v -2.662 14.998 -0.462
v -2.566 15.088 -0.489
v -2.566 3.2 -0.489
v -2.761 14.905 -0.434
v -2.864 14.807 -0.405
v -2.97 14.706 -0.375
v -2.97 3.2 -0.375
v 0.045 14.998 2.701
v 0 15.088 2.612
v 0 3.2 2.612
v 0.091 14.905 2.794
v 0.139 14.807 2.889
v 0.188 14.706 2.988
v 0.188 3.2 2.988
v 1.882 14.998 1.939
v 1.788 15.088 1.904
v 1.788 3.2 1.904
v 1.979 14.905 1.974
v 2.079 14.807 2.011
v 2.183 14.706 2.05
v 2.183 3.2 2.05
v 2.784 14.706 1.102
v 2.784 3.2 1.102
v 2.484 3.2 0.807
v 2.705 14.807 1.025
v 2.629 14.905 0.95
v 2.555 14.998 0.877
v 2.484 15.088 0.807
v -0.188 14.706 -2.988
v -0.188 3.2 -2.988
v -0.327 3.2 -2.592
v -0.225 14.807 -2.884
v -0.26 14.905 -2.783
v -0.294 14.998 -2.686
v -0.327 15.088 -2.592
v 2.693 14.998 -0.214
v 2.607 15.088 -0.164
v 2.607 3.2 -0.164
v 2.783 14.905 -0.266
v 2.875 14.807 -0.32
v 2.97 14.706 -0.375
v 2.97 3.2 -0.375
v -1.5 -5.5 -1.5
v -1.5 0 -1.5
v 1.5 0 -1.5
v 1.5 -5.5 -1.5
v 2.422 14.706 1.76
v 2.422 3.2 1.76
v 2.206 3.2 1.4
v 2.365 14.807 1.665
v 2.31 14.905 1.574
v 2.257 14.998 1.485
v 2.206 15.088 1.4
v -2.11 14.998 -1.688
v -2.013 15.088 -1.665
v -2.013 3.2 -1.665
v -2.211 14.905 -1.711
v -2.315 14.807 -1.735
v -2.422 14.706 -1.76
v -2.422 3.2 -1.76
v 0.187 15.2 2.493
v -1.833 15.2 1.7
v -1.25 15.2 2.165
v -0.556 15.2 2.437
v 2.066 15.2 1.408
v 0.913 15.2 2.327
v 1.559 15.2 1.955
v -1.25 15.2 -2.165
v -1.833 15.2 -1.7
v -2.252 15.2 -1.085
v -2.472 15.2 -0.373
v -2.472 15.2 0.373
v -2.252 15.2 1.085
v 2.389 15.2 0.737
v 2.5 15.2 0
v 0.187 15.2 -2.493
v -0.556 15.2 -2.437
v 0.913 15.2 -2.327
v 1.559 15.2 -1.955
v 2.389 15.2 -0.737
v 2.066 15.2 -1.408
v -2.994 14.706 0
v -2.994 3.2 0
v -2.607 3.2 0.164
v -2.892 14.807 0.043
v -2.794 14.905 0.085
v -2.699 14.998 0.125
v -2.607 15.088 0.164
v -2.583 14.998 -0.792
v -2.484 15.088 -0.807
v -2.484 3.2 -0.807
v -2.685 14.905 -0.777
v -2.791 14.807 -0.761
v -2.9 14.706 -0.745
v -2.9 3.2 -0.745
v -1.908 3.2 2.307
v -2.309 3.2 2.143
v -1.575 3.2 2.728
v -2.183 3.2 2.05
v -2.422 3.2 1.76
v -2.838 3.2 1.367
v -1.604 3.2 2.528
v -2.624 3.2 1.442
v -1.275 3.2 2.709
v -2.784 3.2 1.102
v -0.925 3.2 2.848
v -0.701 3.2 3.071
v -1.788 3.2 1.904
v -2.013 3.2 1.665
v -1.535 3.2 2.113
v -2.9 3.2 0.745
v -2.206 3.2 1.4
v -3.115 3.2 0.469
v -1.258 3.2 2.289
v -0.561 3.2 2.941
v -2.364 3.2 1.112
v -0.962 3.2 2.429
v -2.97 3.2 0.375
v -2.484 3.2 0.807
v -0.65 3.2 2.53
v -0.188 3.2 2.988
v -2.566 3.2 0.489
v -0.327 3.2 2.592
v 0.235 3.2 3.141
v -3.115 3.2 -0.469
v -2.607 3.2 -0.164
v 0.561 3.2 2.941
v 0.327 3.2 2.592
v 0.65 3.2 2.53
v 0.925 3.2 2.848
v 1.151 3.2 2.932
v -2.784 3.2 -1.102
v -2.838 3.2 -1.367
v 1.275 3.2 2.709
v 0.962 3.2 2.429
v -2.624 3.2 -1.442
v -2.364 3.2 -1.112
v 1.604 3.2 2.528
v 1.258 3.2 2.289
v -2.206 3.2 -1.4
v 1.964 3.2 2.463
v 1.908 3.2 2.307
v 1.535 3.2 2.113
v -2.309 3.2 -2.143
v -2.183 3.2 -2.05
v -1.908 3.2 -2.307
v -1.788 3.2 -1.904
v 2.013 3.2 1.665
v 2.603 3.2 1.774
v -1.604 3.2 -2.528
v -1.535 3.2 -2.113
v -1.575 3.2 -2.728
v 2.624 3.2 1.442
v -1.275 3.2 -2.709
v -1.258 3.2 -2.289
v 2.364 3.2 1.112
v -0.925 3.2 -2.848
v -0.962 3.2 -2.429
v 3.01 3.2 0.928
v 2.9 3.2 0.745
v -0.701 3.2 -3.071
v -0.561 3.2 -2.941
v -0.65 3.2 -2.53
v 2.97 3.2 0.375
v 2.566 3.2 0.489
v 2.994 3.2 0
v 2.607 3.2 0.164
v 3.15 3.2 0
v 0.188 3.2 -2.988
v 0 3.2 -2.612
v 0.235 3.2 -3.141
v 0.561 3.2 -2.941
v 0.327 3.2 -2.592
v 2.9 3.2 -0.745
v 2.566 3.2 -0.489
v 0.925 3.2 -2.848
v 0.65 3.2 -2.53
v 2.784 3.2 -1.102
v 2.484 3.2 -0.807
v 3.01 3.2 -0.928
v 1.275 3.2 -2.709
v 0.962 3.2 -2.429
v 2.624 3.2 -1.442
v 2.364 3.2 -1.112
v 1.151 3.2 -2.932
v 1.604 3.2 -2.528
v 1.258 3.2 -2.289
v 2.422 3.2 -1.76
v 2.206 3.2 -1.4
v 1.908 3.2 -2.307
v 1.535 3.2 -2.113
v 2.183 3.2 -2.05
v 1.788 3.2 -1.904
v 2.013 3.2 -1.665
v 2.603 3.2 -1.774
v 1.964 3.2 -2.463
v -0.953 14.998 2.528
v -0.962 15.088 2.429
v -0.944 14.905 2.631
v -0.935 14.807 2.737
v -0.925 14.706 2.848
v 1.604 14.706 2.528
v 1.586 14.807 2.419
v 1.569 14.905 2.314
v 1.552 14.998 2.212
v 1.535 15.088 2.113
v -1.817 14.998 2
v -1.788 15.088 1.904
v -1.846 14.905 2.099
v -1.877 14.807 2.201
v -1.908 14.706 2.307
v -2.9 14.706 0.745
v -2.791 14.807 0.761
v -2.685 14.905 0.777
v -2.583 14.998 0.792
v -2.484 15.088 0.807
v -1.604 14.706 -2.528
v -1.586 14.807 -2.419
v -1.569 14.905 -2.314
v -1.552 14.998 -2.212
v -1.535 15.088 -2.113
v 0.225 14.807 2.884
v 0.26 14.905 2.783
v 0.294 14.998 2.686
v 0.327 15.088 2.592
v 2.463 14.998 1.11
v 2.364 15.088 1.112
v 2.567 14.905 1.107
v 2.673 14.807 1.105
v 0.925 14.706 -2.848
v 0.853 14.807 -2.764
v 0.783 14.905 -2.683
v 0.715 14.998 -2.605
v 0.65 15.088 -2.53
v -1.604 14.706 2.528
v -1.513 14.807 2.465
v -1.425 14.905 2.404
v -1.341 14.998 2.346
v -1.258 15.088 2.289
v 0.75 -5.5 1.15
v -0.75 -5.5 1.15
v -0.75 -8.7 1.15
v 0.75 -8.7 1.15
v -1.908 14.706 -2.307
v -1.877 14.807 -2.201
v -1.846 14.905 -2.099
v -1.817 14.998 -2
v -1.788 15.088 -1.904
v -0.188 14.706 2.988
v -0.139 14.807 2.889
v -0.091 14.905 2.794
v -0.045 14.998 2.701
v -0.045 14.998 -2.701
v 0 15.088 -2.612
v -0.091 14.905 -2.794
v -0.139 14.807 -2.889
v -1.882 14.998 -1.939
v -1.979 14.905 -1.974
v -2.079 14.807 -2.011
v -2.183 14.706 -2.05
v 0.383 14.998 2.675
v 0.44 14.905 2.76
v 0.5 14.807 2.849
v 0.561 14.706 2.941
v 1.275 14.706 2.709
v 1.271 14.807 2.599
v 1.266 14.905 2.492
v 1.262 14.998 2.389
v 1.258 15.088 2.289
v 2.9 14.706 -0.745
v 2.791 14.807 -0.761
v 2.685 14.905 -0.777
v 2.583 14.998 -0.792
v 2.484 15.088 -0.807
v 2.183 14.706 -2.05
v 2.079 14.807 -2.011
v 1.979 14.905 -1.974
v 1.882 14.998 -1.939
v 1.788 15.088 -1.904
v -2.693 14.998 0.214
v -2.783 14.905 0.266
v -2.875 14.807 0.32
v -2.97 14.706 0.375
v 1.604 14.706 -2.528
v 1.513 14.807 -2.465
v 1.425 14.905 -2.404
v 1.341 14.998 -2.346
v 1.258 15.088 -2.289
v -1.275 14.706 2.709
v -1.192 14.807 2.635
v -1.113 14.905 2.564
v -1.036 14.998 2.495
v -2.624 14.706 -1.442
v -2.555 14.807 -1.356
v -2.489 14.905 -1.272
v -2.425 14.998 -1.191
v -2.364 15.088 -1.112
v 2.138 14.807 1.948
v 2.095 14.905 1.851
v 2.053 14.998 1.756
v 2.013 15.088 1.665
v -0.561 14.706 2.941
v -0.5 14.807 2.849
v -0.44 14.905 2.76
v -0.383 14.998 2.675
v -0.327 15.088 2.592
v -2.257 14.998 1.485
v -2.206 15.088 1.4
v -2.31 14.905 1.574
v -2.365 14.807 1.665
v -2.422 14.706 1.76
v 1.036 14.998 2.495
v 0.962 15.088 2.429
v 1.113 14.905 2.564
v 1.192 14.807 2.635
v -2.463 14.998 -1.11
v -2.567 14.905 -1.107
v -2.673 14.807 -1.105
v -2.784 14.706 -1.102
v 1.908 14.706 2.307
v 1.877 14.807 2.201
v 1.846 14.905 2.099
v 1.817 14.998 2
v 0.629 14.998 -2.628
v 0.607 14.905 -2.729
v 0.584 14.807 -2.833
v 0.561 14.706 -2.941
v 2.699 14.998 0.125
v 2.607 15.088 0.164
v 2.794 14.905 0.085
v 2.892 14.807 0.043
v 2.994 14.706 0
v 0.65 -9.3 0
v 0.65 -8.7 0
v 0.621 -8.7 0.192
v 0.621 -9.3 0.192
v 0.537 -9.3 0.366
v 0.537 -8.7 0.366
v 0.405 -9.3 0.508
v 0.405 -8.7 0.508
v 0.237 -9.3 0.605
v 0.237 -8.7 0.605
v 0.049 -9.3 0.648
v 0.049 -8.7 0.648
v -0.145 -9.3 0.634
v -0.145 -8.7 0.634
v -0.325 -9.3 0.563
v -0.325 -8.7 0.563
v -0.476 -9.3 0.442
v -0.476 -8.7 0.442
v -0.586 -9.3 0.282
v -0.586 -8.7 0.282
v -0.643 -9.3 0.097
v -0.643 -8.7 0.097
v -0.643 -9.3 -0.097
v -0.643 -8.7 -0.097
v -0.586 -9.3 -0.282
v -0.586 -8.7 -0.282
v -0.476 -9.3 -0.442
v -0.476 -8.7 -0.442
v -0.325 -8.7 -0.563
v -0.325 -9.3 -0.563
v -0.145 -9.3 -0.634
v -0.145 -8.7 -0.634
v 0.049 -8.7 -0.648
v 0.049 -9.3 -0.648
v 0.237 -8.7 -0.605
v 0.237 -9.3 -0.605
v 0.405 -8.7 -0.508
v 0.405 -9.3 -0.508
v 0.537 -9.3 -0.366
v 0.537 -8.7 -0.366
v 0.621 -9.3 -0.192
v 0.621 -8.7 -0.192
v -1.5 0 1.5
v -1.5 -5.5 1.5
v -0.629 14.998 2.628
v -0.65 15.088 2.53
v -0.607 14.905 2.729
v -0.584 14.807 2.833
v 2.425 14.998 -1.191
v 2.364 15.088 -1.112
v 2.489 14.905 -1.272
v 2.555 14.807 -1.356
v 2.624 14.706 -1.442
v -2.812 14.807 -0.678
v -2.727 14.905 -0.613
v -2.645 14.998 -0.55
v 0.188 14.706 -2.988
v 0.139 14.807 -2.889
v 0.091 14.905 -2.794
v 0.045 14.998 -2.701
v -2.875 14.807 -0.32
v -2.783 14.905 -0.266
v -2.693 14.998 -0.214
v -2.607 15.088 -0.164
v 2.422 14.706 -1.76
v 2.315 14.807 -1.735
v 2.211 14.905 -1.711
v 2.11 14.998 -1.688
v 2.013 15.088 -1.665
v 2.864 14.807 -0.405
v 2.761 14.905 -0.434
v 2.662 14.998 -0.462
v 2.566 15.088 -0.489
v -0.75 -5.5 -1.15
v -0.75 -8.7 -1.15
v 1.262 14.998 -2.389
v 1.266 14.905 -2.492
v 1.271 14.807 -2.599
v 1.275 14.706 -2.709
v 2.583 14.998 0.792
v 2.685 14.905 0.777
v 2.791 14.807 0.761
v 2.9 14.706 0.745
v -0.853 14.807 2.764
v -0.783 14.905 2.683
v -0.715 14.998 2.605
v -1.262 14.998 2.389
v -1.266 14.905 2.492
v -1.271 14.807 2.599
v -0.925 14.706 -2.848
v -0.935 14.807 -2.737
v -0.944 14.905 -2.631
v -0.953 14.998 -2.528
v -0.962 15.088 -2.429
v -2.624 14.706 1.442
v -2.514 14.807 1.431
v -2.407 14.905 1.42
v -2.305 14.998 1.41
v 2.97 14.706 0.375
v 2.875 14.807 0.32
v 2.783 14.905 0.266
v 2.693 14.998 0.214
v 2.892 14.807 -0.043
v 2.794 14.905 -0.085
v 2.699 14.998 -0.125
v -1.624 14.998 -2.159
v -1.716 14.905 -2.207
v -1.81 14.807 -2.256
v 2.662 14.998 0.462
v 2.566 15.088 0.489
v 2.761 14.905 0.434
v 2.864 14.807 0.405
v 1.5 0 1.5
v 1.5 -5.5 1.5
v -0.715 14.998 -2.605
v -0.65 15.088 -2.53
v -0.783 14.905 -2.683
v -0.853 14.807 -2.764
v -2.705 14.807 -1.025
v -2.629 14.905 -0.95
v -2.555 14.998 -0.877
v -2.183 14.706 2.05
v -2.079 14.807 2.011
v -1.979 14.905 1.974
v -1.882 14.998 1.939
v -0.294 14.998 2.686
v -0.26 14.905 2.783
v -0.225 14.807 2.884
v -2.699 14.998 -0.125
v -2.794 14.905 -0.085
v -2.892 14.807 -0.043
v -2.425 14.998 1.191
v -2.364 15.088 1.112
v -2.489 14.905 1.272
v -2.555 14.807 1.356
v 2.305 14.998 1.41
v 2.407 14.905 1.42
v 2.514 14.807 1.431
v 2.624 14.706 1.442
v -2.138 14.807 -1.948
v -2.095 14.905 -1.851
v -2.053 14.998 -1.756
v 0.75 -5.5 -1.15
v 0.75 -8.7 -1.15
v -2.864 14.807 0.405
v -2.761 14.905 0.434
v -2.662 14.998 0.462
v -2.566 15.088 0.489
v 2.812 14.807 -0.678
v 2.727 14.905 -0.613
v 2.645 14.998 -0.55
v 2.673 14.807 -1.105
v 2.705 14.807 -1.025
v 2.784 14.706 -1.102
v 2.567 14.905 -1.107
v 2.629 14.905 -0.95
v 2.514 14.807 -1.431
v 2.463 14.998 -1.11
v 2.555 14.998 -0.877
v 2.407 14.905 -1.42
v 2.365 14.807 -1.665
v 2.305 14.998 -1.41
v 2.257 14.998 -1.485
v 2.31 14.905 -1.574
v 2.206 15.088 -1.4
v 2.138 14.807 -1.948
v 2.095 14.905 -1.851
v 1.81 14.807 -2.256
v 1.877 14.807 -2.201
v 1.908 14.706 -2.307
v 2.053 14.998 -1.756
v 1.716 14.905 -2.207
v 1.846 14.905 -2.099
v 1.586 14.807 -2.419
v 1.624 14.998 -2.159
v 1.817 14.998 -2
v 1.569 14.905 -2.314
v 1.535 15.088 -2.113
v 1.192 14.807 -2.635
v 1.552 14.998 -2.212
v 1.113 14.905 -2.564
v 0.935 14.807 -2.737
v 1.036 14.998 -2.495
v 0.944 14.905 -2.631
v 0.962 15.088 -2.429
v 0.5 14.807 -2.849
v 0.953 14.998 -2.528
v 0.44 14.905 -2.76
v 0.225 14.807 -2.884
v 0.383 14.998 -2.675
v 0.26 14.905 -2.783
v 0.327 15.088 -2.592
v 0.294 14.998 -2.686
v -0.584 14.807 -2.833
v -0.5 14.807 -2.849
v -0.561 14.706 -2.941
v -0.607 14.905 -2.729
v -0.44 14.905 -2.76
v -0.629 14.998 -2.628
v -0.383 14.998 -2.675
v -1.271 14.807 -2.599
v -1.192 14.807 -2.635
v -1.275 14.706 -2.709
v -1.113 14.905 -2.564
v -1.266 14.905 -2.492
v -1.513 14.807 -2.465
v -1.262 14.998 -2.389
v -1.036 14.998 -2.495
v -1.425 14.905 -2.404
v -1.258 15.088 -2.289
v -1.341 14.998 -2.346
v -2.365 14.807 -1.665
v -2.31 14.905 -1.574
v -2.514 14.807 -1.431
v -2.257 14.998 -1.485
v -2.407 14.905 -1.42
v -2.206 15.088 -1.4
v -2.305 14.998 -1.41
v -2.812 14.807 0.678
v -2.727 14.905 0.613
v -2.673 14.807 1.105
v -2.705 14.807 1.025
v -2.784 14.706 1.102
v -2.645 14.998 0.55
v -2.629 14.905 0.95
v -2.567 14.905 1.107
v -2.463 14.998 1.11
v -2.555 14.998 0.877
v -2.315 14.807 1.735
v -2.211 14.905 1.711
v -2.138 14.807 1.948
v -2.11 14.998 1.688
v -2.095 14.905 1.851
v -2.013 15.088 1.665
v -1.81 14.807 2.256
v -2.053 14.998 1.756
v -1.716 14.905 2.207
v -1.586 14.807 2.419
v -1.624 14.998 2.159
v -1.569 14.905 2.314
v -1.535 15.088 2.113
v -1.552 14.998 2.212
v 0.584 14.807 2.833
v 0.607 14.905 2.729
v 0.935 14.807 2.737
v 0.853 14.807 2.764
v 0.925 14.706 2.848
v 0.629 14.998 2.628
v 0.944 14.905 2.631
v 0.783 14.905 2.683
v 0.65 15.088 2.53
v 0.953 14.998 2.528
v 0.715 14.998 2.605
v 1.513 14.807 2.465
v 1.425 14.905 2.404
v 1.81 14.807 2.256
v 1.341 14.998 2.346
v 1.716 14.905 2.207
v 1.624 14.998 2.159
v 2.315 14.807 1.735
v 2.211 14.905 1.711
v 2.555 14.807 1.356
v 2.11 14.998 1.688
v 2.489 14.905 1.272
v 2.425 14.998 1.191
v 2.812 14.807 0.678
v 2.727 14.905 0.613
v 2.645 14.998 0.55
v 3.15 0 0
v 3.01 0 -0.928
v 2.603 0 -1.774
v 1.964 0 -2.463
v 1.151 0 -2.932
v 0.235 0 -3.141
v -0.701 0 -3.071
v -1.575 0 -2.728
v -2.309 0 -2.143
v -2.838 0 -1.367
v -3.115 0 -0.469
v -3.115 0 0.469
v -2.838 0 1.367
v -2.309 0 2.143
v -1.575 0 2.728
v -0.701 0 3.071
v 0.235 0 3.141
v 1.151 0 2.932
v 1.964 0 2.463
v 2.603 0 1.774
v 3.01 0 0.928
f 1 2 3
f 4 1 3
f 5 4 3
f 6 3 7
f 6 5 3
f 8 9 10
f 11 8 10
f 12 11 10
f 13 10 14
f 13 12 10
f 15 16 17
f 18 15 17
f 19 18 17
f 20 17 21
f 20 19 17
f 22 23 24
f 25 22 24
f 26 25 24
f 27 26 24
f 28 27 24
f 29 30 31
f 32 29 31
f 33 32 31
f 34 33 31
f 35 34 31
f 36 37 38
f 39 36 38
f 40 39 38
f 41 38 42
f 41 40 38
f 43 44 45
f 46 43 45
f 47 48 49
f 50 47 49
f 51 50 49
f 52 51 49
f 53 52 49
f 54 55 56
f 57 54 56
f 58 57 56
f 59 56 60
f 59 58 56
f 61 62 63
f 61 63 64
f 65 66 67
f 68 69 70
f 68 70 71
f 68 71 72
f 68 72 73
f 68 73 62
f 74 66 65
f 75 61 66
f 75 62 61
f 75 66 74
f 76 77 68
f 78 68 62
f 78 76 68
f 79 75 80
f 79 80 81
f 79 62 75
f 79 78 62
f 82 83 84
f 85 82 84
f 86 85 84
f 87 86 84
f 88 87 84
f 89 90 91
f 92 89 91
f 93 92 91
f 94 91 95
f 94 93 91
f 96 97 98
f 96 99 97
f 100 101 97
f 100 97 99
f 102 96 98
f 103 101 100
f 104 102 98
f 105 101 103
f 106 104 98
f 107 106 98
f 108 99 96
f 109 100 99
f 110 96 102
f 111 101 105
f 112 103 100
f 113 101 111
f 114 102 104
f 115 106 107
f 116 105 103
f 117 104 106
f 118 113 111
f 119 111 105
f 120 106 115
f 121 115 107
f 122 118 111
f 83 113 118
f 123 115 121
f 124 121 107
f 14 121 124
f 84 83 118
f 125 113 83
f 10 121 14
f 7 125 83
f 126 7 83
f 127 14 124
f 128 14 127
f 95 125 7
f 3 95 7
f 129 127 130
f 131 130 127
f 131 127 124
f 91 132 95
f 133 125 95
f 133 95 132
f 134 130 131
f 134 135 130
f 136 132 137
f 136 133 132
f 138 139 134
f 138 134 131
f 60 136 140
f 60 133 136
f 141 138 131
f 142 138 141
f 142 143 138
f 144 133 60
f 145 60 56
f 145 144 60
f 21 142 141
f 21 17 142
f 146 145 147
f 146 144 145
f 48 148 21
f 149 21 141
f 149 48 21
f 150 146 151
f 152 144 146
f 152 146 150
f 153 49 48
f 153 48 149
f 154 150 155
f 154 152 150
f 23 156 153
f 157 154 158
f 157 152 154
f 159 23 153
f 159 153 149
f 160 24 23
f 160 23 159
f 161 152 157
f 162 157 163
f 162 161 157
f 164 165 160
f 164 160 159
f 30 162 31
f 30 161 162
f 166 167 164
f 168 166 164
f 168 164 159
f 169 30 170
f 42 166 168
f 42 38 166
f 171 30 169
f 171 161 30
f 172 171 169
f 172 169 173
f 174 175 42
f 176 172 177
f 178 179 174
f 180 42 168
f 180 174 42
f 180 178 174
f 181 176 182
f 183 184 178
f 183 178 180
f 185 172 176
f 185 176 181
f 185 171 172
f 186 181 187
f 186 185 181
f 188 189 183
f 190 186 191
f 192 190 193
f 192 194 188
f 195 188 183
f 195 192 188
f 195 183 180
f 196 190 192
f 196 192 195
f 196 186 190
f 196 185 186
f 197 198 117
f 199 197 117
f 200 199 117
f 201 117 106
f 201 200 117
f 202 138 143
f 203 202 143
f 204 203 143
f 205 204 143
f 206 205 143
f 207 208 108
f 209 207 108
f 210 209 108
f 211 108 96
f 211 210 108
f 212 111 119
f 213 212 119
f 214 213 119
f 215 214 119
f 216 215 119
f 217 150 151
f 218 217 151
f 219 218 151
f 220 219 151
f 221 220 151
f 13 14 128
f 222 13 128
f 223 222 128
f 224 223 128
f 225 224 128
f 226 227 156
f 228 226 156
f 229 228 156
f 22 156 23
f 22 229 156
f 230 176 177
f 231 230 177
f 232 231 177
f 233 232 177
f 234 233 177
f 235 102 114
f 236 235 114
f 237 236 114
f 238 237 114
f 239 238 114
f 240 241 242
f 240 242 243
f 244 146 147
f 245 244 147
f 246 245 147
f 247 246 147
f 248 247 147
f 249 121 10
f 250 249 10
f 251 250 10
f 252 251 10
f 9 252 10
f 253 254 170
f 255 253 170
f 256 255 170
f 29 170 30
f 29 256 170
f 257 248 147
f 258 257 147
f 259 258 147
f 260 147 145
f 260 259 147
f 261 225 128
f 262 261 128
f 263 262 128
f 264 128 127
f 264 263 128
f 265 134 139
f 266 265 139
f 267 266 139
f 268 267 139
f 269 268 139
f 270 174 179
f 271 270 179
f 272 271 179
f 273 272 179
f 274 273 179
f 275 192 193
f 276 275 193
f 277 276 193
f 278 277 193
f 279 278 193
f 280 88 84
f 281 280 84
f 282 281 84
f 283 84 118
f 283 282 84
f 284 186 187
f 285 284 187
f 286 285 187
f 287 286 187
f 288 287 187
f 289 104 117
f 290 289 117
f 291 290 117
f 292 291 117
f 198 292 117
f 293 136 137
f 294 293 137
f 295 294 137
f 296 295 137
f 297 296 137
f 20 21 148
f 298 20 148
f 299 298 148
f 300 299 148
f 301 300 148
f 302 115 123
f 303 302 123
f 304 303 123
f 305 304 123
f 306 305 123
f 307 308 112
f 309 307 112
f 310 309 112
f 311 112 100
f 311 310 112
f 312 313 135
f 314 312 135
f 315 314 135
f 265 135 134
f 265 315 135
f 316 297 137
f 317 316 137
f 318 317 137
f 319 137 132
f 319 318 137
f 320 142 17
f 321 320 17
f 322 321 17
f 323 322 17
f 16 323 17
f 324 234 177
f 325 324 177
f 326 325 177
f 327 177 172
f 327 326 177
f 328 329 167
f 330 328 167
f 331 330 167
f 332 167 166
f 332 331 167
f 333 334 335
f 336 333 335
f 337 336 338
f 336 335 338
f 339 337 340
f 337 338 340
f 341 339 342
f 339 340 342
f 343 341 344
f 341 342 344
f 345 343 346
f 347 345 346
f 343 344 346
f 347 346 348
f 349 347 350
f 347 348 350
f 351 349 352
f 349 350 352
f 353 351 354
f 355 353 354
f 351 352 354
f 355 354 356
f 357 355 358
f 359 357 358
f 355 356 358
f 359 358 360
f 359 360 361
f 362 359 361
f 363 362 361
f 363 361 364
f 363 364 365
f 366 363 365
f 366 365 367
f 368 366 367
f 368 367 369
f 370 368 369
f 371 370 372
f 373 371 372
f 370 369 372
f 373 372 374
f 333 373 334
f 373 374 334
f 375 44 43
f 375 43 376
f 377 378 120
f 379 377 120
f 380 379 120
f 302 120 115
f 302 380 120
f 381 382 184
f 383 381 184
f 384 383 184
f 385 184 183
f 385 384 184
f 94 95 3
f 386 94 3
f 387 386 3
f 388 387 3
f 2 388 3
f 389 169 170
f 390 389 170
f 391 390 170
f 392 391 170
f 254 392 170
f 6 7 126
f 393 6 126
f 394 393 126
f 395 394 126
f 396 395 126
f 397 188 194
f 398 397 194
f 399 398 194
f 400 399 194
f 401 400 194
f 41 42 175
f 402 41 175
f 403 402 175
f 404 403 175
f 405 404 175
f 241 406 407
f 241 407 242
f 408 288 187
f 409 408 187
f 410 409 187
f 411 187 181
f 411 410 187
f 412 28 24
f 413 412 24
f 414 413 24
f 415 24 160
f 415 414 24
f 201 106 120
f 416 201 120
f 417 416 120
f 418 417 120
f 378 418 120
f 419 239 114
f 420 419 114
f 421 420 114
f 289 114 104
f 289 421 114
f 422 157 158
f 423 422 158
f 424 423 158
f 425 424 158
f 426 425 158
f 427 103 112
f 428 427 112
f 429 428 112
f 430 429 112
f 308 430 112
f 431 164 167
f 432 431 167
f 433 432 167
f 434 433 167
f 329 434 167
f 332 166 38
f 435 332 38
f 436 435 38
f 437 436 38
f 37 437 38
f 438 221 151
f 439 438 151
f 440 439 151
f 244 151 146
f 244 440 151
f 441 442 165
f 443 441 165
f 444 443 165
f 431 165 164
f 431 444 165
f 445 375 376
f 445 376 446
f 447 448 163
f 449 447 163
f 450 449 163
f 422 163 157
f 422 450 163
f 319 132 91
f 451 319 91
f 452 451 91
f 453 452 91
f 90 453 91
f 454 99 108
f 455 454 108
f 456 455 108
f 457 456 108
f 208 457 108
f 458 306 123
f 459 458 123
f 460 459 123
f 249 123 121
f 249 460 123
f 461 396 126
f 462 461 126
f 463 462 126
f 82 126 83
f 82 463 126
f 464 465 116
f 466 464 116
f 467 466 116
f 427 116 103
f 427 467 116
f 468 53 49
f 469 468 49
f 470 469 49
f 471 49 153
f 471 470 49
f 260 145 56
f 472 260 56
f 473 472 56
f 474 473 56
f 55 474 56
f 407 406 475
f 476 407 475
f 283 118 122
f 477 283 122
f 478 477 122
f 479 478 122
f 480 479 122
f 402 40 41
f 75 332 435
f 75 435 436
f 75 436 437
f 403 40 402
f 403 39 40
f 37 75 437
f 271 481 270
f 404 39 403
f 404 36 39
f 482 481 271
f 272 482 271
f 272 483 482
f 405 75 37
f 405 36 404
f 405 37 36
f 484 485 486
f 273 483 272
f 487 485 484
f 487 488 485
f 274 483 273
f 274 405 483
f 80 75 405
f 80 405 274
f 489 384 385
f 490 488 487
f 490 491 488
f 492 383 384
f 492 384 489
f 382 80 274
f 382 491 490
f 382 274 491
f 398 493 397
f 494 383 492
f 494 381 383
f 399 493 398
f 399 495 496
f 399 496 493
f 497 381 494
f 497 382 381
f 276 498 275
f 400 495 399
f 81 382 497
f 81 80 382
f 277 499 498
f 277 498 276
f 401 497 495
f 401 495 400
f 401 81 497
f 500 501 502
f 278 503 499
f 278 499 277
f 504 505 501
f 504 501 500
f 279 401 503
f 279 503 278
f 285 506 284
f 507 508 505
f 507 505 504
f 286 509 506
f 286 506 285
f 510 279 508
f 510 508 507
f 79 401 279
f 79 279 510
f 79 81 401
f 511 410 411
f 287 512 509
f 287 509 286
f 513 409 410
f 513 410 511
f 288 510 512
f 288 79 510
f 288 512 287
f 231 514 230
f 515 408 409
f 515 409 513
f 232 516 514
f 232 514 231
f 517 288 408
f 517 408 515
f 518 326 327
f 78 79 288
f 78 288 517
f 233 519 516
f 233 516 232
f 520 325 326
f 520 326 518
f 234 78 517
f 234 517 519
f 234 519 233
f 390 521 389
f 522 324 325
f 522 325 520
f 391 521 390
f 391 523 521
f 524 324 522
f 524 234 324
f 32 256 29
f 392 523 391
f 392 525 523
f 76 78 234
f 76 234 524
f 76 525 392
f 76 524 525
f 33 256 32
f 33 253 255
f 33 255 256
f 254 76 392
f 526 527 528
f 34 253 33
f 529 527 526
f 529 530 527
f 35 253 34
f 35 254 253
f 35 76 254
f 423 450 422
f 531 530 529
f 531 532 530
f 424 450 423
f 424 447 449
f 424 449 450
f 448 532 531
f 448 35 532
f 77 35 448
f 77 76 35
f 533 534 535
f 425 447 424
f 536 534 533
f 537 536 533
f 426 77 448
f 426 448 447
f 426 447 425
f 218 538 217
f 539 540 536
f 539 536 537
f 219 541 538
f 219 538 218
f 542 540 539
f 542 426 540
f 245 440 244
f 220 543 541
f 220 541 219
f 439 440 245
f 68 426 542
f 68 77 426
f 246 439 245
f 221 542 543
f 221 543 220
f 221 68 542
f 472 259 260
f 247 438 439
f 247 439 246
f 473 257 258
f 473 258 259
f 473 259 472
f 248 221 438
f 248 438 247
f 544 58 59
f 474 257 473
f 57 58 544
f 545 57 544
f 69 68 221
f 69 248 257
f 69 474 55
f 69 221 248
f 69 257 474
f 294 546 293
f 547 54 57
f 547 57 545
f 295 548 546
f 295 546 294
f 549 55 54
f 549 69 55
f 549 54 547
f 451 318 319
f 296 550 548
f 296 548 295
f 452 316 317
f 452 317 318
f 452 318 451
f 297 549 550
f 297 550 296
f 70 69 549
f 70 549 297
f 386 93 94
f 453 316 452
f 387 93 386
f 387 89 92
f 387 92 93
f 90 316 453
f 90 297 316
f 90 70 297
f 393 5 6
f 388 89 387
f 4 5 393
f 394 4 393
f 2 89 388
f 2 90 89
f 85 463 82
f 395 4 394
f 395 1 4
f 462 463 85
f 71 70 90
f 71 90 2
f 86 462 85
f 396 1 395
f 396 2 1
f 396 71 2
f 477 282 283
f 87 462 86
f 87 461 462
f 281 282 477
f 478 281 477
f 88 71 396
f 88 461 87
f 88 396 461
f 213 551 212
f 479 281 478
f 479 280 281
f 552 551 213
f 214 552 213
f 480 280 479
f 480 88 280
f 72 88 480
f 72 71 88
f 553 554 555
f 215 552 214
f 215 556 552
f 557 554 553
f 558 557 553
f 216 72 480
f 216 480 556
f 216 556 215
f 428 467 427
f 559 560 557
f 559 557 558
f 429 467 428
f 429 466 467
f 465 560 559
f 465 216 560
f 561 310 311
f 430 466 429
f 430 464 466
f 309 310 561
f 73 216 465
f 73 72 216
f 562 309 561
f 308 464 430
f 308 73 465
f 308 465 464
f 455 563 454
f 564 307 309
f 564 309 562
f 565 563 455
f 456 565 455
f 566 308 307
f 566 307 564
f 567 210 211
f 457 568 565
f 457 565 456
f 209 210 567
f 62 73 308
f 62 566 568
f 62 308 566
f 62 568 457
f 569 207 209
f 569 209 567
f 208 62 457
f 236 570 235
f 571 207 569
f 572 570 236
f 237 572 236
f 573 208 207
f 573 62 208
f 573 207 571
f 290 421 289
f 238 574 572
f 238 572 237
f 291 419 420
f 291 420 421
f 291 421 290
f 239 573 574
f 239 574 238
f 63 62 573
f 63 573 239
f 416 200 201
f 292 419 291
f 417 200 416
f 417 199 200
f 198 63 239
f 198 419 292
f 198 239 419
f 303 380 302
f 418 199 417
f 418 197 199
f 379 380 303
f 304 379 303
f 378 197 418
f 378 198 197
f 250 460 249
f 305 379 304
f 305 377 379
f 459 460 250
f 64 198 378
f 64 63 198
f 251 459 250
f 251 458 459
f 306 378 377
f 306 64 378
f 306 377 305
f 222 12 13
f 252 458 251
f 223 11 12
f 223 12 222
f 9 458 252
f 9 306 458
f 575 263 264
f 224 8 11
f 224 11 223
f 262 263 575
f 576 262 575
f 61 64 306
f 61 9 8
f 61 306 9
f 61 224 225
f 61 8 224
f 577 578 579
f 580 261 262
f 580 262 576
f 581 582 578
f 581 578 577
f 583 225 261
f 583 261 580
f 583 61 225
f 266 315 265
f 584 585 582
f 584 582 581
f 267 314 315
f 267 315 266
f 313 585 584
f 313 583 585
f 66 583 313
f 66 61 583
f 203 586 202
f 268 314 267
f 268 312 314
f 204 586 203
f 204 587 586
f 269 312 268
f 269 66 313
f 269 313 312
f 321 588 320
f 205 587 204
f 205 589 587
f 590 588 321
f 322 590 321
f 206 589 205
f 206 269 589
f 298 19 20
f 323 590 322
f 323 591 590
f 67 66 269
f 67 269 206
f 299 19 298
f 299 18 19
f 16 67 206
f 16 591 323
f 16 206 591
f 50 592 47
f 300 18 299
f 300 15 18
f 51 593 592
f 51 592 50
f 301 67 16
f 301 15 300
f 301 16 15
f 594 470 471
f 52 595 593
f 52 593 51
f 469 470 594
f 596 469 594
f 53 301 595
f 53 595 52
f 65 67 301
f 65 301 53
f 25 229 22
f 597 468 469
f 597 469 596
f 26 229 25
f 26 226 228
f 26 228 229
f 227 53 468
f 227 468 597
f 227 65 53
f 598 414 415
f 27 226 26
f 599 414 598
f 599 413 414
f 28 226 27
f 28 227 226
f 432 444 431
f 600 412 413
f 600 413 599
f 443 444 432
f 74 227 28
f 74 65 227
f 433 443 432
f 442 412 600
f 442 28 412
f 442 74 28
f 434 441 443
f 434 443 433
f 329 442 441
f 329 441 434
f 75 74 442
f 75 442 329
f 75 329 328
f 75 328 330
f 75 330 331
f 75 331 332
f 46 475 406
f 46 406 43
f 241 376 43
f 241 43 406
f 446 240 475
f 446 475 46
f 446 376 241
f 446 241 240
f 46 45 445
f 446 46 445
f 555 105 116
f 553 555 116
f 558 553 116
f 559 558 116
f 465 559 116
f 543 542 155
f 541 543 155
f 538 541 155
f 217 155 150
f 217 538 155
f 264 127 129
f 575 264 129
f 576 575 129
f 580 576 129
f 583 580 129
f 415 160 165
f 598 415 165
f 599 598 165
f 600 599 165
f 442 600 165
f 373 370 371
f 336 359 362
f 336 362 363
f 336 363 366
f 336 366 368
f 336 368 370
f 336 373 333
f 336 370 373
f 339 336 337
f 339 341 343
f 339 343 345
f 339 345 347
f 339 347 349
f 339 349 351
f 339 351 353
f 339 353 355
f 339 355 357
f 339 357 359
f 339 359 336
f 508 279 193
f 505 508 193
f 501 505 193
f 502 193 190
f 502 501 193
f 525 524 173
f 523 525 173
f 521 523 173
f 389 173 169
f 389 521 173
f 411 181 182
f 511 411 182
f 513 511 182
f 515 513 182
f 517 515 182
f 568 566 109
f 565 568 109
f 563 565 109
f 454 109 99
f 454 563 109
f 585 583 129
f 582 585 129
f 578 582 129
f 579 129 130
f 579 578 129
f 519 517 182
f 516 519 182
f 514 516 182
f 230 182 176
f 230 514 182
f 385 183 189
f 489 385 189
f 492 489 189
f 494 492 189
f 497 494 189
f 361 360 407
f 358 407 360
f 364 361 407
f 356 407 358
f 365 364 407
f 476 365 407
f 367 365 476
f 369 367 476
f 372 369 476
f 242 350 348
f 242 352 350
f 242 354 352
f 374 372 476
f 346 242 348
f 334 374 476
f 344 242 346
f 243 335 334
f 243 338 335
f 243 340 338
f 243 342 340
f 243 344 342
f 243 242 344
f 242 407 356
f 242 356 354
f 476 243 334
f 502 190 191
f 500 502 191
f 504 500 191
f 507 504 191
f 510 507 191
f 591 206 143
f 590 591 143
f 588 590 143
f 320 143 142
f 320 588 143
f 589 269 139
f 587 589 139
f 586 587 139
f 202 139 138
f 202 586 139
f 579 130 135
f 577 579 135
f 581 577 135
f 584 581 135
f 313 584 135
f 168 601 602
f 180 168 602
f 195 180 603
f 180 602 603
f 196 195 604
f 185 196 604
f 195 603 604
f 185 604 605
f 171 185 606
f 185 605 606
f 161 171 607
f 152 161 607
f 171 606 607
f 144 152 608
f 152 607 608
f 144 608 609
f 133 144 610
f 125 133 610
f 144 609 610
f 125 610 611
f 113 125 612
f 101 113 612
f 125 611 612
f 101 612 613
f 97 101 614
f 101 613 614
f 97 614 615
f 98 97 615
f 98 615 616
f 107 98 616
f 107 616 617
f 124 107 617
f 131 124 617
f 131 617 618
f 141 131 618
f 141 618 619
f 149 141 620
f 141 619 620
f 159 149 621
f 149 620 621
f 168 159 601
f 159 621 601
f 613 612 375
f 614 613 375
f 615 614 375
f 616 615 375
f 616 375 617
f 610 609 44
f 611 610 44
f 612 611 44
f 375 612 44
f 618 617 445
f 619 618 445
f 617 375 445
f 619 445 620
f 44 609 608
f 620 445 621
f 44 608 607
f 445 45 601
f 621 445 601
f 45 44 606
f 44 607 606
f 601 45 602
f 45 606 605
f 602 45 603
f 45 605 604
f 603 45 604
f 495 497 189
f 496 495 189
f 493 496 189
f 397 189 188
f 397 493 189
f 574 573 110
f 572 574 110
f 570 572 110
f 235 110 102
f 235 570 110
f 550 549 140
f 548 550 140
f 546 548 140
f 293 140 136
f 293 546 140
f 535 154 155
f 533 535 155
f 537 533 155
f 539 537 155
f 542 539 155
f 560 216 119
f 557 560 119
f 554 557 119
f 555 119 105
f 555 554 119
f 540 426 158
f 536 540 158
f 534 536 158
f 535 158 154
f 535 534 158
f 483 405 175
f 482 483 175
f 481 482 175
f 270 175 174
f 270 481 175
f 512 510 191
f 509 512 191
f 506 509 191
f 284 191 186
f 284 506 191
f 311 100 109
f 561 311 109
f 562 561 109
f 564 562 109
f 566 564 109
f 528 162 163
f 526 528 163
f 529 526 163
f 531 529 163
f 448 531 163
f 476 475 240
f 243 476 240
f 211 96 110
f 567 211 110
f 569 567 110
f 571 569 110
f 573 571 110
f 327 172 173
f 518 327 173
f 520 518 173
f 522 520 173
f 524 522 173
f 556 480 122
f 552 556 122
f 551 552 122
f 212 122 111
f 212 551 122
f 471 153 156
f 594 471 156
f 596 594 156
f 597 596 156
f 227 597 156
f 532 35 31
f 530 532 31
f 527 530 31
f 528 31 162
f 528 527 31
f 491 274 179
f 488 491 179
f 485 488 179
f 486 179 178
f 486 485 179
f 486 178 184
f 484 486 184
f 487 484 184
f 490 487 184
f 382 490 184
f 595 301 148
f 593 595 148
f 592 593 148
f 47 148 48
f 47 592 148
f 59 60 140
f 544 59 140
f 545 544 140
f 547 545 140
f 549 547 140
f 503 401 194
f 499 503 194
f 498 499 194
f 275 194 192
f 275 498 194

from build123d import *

# Parameters (mm, degrees)
SKETCH_1_R               = 3.15
EXTRUDE_1_DEPTH          = 3.2
SKETCH_2_R               = 3
EXTRUDE_2_DEPTH          = 12
CHAMFER_1_SIZE           = 0.5
SKETCH_3_W               = 3
SKETCH_3_H               = 3
EXTRUDE_3_DEPTH          = 5.5
SKETCH_4_W               = 1.5
SKETCH_4_H               = 2.3
EXTRUDE_4_DEPTH          = 3.2
SKETCH_5_R               = 0.65
EXTRUDE_5_DEPTH          = 0.6
CUT_EXTRUDE_1_DEPTH      = 12
PATTERN_CIRCULAR_1_COUNT = 50


with BuildPart() as part:
    # Эскиз1 → Бобышка-Вытянуть1 (new body)
    with BuildSketch(Plane(origin=(0, 0, 0), x_dir=(1, 0, 0), z_dir=(0, 1, 0))):
        Circle(SKETCH_1_R)
    extrude(amount=EXTRUDE_1_DEPTH)

    # Эскиз2 → Бобышка-Вытянуть2 (add)
    with BuildSketch(Plane(origin=(0, 3.2, 0), x_dir=(1, 0, 0), z_dir=(0, 1, 0))):
        Circle(SKETCH_2_R)
    extrude(amount=EXTRUDE_2_DEPTH)

    # Фаска1
    chamfer_1_edges = [part.edges().sort_by_distance(p)[0] for p in [
        (-3, 15.2, 0),
    ]]
    chamfer(chamfer_1_edges, length=CHAMFER_1_SIZE)

    # Эскиз3 → Бобышка-Вытянуть3 (add)
    with BuildSketch(Plane.XZ):
        Rectangle(SKETCH_3_W, SKETCH_3_H)
    extrude(amount=EXTRUDE_3_DEPTH)

    # Эскиз4 → Бобышка-Вытянуть4 (add)
    with BuildSketch(Plane.XZ.offset(5.5)):
        Rectangle(SKETCH_4_W, SKETCH_4_H)
    extrude(amount=EXTRUDE_4_DEPTH)

    # Эскиз5 → Бобышка-Вытянуть5 (add)
    with BuildSketch(Plane.XZ.offset(8.7)):
        Circle(SKETCH_5_R)
    extrude(amount=EXTRUDE_5_DEPTH)

    # Эскиз7 → Вырез-Вытянуть1 (cut)
    with BuildSketch(Plane(origin=(0, 15.2, 0), x_dir=(1, 0, 0), z_dir=(0, 1, 0))):
        Polygon((0, 2.612170904), (-0.2, 3.012170904), (0.2, 3.012170904), align=None)
    cut_extrude_1 = extrude(amount=-CUT_EXTRUDE_1_DEPTH, mode=Mode.SUBTRACT)

    # Круговой массив1: Вырез-Вытянуть1 ×50 about axis
    pattern_circular_1_axis = Axis((0, 0, 0), (0, 1, 0))
    for i in range(1, PATTERN_CIRCULAR_1_COUNT):
        add(cut_extrude_1.rotate(pattern_circular_1_axis, i * 360 / PATTERN_CIRCULAR_1_COUNT), mode=Mode.SUBTRACT)


solid = part.part
